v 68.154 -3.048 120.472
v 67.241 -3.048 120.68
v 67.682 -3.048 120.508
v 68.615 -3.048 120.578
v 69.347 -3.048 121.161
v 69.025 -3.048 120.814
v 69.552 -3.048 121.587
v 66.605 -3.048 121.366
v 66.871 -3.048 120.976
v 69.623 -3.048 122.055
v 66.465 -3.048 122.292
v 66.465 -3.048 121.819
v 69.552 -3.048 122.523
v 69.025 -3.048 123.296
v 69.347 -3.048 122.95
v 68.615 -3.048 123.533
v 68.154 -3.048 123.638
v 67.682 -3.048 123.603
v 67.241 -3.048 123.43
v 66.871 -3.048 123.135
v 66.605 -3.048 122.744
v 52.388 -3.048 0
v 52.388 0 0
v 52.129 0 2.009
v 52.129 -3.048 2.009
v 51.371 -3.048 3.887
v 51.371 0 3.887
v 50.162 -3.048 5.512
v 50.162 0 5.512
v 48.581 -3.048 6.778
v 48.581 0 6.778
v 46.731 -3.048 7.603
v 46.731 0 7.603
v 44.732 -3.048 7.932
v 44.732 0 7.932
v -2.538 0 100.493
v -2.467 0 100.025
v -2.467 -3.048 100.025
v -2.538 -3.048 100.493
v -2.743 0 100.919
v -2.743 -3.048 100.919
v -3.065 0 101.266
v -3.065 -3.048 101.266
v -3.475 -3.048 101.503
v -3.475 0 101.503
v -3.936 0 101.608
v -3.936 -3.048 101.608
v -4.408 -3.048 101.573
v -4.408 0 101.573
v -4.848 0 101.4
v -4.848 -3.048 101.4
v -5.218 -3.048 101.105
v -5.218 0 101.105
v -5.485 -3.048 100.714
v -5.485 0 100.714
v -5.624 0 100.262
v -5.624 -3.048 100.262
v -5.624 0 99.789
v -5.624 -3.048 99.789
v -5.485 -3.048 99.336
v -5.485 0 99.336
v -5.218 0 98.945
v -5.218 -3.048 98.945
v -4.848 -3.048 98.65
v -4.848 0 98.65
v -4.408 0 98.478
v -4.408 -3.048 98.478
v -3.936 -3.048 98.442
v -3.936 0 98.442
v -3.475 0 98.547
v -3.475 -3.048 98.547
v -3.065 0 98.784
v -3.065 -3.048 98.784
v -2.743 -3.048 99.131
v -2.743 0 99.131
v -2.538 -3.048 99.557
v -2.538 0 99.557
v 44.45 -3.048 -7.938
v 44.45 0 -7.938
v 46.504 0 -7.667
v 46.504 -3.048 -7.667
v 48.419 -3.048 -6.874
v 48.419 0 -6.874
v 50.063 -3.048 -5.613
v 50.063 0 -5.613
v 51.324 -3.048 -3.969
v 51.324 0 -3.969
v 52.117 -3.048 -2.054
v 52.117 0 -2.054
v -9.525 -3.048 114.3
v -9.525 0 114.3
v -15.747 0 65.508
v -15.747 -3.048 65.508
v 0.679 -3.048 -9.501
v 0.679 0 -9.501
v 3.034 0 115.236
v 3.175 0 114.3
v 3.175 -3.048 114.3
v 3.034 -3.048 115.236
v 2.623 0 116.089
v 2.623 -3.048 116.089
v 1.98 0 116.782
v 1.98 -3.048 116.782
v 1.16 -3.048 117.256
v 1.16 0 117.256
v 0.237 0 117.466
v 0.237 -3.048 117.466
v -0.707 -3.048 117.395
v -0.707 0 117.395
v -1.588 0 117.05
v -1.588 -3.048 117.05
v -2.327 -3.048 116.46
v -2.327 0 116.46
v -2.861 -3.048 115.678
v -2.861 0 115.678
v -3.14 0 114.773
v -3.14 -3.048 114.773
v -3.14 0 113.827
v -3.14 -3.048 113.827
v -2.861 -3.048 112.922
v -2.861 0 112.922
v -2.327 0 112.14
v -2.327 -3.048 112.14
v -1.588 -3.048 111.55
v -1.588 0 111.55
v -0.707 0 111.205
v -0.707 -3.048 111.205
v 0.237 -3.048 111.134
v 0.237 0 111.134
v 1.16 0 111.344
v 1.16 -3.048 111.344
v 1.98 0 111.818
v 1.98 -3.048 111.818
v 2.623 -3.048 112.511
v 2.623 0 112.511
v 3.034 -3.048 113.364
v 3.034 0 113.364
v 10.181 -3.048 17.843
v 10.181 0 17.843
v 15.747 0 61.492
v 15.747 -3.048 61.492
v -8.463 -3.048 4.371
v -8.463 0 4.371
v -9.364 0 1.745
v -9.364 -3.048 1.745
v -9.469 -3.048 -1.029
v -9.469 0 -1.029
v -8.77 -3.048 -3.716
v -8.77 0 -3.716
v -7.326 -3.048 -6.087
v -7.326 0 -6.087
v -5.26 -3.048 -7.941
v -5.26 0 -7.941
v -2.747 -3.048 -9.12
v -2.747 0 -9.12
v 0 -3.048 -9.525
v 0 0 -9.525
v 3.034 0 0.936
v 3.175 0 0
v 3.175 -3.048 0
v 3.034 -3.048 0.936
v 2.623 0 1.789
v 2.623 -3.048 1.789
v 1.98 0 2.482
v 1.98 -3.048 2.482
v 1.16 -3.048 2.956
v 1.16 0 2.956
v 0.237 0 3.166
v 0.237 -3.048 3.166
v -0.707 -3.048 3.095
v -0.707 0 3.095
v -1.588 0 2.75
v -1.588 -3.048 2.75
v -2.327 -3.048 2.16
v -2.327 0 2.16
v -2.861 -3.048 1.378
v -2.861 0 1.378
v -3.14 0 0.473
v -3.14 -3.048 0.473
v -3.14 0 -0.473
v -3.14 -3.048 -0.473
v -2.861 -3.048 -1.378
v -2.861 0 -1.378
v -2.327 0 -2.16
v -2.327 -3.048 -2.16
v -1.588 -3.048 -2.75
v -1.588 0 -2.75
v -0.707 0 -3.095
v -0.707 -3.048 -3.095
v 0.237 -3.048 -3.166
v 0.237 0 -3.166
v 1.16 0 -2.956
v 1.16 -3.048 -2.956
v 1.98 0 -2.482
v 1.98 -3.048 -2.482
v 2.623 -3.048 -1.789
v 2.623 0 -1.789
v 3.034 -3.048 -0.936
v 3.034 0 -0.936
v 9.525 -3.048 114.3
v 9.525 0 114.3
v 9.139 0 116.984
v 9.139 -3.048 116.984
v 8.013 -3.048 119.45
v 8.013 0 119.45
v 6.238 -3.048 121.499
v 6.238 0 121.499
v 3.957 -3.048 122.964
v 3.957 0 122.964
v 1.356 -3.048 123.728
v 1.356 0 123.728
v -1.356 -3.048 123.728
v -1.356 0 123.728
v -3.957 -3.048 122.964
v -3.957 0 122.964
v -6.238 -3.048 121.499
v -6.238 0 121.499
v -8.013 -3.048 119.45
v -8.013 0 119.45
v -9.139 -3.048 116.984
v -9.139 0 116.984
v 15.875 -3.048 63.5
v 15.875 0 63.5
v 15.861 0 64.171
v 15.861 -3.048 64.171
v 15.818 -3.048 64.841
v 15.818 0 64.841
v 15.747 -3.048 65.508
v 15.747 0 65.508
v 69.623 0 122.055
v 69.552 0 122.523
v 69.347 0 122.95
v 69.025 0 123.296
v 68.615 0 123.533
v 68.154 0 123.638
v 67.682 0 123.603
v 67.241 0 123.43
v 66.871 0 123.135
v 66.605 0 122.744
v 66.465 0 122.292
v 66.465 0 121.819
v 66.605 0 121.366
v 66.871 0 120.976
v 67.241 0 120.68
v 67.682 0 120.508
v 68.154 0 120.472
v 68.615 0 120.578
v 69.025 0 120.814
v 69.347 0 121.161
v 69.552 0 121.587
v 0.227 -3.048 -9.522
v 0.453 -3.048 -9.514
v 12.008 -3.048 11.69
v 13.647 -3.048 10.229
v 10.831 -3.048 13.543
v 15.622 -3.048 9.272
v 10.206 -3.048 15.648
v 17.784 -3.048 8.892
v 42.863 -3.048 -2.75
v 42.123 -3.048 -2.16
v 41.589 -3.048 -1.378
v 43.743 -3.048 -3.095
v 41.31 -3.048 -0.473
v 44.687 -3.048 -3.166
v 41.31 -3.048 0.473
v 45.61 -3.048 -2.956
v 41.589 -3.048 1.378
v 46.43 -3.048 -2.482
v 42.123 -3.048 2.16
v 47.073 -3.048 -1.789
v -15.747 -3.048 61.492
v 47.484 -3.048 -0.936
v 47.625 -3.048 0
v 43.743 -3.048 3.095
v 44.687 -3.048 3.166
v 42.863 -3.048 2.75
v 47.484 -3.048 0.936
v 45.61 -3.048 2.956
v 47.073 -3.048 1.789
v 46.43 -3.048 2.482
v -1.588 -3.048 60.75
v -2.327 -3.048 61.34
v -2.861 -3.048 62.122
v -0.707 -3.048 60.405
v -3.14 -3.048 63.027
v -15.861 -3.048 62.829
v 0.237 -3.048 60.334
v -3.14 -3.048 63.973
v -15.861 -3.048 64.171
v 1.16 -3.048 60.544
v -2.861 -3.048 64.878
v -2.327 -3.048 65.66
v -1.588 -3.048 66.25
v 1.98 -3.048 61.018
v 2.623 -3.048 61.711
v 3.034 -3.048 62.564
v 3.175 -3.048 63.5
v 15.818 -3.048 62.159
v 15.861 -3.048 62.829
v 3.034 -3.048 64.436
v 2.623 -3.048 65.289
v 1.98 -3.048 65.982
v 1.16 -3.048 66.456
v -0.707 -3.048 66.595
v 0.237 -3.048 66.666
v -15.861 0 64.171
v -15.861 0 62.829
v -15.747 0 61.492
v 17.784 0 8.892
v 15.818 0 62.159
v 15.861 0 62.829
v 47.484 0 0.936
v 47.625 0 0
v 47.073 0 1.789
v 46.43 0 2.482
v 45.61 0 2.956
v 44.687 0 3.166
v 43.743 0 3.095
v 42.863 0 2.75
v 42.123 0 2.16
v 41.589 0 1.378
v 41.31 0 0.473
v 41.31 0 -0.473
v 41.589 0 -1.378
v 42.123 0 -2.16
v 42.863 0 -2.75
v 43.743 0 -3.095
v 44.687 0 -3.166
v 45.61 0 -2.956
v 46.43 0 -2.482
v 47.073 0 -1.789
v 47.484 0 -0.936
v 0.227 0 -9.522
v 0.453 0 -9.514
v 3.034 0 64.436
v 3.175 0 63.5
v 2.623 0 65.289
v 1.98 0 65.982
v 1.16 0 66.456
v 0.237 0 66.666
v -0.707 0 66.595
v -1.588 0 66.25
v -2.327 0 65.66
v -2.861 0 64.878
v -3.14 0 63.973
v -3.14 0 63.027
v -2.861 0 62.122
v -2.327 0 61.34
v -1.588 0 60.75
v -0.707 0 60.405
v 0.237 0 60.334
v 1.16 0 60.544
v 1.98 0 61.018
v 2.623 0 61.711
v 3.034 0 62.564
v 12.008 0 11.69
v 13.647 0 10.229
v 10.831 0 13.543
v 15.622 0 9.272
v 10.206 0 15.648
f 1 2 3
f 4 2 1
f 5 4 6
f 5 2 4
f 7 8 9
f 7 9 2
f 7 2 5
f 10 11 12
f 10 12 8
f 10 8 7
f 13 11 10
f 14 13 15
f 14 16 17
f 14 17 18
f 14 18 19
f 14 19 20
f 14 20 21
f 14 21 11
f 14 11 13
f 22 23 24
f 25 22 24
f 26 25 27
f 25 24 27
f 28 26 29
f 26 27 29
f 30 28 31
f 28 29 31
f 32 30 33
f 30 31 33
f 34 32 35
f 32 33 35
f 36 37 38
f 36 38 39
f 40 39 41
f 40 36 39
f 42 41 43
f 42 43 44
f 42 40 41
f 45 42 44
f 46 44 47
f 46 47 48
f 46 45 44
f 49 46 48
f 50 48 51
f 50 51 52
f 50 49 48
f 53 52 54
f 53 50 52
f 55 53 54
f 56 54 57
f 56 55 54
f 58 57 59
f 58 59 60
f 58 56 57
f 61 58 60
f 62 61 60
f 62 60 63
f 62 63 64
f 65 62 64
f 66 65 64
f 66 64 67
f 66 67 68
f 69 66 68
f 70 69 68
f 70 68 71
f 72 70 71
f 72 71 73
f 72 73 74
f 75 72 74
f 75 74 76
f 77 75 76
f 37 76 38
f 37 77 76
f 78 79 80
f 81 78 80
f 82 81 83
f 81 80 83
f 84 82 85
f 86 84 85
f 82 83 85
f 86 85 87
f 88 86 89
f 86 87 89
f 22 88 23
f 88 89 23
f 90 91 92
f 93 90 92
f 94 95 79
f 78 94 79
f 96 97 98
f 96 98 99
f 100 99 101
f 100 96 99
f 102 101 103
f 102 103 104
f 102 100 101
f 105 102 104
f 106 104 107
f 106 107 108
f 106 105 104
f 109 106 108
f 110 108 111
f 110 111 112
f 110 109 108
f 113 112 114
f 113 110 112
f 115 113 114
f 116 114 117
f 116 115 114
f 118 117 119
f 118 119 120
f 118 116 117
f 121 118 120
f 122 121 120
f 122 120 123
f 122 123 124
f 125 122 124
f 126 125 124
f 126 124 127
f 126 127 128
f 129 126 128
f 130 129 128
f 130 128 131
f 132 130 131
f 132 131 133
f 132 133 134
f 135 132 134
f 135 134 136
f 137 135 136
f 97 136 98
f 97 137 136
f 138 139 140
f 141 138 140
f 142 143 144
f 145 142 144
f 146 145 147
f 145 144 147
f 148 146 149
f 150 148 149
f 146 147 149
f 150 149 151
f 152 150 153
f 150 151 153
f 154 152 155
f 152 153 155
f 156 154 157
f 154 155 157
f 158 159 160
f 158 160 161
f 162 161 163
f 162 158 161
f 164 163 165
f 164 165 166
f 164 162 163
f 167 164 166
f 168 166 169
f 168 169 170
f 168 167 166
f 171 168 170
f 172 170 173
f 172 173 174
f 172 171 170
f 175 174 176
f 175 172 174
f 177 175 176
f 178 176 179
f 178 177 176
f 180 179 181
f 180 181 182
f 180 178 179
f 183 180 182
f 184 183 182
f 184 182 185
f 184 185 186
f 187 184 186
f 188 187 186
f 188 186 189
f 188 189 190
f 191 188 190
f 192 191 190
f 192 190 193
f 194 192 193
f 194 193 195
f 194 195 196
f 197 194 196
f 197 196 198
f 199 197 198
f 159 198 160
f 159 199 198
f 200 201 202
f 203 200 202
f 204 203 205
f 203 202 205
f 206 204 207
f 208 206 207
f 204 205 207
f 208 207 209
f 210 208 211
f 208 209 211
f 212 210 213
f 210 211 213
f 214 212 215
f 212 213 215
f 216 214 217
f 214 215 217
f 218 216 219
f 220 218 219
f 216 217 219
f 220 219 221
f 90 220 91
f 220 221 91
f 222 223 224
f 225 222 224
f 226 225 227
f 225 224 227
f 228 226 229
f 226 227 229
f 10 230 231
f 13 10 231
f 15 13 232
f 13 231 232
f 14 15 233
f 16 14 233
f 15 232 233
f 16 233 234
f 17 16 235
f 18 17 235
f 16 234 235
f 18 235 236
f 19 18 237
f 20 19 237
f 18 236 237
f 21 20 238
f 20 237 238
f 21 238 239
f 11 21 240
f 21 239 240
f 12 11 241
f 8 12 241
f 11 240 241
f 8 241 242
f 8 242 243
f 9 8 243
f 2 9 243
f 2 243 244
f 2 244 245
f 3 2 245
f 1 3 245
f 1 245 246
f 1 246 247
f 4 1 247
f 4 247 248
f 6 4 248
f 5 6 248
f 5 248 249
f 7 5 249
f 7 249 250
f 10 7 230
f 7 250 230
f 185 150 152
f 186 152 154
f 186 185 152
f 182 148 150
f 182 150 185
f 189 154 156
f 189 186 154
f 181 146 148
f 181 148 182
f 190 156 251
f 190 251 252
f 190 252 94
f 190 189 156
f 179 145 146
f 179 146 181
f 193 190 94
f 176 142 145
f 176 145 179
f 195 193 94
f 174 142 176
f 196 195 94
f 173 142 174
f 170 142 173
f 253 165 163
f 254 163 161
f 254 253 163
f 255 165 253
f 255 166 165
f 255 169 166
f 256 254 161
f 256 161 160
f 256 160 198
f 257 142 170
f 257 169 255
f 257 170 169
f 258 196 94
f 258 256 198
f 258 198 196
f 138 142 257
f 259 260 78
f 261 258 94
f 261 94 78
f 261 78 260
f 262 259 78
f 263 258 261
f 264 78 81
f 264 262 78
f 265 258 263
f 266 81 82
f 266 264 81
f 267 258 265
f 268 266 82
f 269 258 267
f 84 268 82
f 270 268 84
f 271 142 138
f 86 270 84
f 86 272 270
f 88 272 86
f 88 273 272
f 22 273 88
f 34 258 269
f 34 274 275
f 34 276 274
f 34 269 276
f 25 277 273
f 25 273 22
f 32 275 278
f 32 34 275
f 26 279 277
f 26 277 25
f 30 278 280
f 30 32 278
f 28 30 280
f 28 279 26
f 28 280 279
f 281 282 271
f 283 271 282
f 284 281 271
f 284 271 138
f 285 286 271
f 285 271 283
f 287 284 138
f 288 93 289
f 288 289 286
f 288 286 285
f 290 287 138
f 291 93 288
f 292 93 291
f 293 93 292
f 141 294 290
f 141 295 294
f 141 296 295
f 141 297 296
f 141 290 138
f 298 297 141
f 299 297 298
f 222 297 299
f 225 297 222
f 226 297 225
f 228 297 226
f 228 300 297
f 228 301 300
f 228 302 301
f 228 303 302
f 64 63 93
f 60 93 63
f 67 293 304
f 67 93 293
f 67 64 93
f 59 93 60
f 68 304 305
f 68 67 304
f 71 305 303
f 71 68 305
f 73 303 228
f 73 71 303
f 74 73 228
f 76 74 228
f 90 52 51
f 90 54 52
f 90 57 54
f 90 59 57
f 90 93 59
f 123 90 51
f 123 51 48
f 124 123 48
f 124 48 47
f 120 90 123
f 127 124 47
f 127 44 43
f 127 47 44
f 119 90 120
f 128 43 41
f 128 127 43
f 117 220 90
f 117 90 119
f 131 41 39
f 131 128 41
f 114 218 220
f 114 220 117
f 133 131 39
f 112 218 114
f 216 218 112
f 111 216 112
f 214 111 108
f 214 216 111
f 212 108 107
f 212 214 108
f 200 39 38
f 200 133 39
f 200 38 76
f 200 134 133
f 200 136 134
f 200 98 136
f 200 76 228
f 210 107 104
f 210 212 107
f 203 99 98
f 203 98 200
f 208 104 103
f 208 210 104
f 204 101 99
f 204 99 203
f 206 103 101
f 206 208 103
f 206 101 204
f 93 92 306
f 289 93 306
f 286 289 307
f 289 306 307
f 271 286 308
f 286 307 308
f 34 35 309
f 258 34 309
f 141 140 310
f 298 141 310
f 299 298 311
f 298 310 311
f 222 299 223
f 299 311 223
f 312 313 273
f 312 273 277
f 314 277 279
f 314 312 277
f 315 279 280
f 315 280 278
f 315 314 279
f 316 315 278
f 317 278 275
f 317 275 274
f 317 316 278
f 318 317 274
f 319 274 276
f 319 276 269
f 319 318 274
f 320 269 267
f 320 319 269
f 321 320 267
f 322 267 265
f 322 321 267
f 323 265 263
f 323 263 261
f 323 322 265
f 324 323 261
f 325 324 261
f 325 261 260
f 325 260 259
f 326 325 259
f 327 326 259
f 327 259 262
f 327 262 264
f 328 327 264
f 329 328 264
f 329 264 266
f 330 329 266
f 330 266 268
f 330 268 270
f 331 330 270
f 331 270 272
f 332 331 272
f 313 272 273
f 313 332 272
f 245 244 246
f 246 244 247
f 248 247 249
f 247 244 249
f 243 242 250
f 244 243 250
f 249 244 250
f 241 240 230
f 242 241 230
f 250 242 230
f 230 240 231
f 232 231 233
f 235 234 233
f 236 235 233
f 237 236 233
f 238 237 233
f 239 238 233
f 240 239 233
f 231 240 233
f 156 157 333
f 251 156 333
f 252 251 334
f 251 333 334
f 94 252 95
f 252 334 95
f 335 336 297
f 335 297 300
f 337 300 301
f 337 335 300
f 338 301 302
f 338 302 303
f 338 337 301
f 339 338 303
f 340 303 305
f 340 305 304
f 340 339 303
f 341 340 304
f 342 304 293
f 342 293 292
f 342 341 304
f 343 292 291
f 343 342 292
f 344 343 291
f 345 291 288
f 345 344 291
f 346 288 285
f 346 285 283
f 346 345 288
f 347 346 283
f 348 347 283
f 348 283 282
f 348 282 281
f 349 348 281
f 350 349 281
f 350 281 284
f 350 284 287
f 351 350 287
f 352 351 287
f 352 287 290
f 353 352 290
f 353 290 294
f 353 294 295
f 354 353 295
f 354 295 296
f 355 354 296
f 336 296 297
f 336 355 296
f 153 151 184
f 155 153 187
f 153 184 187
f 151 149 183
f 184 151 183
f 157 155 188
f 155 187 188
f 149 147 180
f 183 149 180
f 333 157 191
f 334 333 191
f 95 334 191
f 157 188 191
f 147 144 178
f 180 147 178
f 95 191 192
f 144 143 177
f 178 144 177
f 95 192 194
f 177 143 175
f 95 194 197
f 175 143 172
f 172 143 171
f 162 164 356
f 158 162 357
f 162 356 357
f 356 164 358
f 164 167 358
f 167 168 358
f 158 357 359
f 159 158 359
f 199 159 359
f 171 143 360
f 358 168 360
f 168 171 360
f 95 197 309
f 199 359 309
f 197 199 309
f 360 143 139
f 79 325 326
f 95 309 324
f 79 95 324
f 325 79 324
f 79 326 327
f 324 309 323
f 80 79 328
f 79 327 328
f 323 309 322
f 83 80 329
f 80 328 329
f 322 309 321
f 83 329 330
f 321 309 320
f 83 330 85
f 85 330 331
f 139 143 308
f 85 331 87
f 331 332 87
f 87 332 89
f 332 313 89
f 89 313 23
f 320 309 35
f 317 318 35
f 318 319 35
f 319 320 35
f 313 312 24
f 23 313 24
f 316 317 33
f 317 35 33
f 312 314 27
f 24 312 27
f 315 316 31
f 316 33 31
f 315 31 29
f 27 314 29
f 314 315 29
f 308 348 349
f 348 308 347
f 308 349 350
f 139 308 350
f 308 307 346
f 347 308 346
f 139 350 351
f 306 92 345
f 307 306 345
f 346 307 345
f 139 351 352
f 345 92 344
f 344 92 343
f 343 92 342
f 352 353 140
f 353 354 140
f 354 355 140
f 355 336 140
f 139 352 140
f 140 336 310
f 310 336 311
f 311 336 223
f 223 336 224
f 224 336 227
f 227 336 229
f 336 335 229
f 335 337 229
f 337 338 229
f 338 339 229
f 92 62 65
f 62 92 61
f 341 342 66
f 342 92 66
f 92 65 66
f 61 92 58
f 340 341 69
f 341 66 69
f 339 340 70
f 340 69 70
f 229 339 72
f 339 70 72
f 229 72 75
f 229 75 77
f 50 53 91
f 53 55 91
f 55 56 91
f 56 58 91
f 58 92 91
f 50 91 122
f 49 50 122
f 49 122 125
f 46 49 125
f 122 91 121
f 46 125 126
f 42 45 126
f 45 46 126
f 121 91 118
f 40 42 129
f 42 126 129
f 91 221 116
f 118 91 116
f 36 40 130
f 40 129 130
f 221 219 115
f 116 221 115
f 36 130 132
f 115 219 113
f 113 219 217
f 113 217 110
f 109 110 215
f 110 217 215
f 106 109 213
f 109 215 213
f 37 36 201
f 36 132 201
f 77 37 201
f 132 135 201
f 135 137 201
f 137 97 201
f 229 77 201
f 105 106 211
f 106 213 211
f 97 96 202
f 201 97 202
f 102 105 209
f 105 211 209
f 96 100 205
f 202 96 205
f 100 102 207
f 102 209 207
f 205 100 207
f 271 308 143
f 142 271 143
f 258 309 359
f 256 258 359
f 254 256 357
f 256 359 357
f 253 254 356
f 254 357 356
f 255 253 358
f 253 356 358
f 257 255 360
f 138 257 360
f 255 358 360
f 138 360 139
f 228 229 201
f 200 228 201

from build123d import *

# Parameters (mm, degrees)
F0_R     = 3.175
F0_R_2   = 1.5875
F1_DEPTH = 3.048


with BuildPart() as f1:
    # F0 (on Front) → F1 (new body)
    with BuildSketch(Plane.XZ):
        with BuildLine():
            ThreePointArc((-9.525, 114.3), (0, 104.775), (9.525, 114.3))
            ThreePointArc((9.525, 114.3), (0, 123.825), (-9.525, 114.3))
        make_face()
        with Locations((0, 114.3)):
            Circle(F0_R, mode=Mode.SUBTRACT)
        with BuildLine():
            Line((15.747457, 65.508289), (9.525, 114.3))
            ThreePointArc((9.525, 114.3), (0, 104.775), (-9.525, 114.3))
            Line((-9.525, 114.3), (-15.747457, 65.508289))
            ThreePointArc((-15.747457, 65.508289), (0, 79.375), (15.747457, 65.508289))
        make_face()
        with Locations((-4.054705, 100.0252)):
            Circle(F0_R_2, mode=Mode.SUBTRACT)
        with BuildLine():
            ThreePointArc((15.875, 63.5), (15.843082, 64.506168), (15.747457, 65.508289))
            ThreePointArc((15.747457, 65.508289), (0, 79.375), (-15.747457, 65.508289))
            ThreePointArc((-15.747457, 65.508289), (-15.875, 63.5), (-15.747457, 61.491711))
            ThreePointArc((-15.747457, 61.491711), (0, 47.625), (15.747457, 61.491711))
            ThreePointArc((15.747457, 61.491711), (15.843082, 62.493832), (15.875, 63.5))
        make_face()
        with Locations((0, 63.5)):
            Circle(F0_R, mode=Mode.SUBTRACT)
        with BuildLine():
            ThreePointArc((15.747457, 61.491711), (0, 47.625), (-15.747457, 61.491711))
            Line((-15.747457, 61.491711), (-8.462807, 4.371101))
            ThreePointArc((-8.462807, 4.371101), (2.249154, 9.255643), (9.525, 0))
            ThreePointArc((9.525, 0), (6.97129, -6.490511), (0.67949, -9.500732))
            Line((0.67949, -9.500732), (44.45, -7.9375))
            ThreePointArc((44.45, -7.9375), (36.513756, 0.141225), (44.732405, 7.932475))
            Line((44.732405, 7.932475), (17.784333, 8.891857))
            ThreePointArc((17.784333, 8.891857), (12.008013, 11.68998), (10.180863, 17.842775))
            Line((10.180863, 17.842775), (15.747457, 61.491711))
        make_face()
        with BuildLine():
            ThreePointArc((9.525, 0), (2.249154, 9.255643), (-8.462807, 4.371101))
            ThreePointArc((-8.462807, 4.371101), (-8.13512, -4.954336), (0, -9.525))
            Line((0, -9.525), (0.67949, -9.500732))
            ThreePointArc((0.67949, -9.500732), (6.97129, -6.490511), (9.525, 0))
        make_face()
        Circle(F0_R, mode=Mode.SUBTRACT)
        with BuildLine():
            Line((0.67949, -9.500732), (0, -9.525))
            ThreePointArc((0, -9.525), (0.339962, -9.518931), (0.67949, -9.500732))
        make_face()
        with BuildLine():
            ThreePointArc((52.3875, 0), (50.161633, 5.51191), (44.732405, 7.932475))
            ThreePointArc((44.732405, 7.932475), (36.513756, 0.141225), (44.45, -7.9375))
            ThreePointArc((44.45, -7.9375), (50.06266, -5.61266), (52.3875, 0))
        make_face()
        with Locations((44.45, 0)):
            Circle(F0_R, mode=Mode.SUBTRACT)
        with Locations((68.035126, 122.055277)):
            Circle(F0_R_2)
    extrude(amount=F1_DEPTH)


solid = f1.part
